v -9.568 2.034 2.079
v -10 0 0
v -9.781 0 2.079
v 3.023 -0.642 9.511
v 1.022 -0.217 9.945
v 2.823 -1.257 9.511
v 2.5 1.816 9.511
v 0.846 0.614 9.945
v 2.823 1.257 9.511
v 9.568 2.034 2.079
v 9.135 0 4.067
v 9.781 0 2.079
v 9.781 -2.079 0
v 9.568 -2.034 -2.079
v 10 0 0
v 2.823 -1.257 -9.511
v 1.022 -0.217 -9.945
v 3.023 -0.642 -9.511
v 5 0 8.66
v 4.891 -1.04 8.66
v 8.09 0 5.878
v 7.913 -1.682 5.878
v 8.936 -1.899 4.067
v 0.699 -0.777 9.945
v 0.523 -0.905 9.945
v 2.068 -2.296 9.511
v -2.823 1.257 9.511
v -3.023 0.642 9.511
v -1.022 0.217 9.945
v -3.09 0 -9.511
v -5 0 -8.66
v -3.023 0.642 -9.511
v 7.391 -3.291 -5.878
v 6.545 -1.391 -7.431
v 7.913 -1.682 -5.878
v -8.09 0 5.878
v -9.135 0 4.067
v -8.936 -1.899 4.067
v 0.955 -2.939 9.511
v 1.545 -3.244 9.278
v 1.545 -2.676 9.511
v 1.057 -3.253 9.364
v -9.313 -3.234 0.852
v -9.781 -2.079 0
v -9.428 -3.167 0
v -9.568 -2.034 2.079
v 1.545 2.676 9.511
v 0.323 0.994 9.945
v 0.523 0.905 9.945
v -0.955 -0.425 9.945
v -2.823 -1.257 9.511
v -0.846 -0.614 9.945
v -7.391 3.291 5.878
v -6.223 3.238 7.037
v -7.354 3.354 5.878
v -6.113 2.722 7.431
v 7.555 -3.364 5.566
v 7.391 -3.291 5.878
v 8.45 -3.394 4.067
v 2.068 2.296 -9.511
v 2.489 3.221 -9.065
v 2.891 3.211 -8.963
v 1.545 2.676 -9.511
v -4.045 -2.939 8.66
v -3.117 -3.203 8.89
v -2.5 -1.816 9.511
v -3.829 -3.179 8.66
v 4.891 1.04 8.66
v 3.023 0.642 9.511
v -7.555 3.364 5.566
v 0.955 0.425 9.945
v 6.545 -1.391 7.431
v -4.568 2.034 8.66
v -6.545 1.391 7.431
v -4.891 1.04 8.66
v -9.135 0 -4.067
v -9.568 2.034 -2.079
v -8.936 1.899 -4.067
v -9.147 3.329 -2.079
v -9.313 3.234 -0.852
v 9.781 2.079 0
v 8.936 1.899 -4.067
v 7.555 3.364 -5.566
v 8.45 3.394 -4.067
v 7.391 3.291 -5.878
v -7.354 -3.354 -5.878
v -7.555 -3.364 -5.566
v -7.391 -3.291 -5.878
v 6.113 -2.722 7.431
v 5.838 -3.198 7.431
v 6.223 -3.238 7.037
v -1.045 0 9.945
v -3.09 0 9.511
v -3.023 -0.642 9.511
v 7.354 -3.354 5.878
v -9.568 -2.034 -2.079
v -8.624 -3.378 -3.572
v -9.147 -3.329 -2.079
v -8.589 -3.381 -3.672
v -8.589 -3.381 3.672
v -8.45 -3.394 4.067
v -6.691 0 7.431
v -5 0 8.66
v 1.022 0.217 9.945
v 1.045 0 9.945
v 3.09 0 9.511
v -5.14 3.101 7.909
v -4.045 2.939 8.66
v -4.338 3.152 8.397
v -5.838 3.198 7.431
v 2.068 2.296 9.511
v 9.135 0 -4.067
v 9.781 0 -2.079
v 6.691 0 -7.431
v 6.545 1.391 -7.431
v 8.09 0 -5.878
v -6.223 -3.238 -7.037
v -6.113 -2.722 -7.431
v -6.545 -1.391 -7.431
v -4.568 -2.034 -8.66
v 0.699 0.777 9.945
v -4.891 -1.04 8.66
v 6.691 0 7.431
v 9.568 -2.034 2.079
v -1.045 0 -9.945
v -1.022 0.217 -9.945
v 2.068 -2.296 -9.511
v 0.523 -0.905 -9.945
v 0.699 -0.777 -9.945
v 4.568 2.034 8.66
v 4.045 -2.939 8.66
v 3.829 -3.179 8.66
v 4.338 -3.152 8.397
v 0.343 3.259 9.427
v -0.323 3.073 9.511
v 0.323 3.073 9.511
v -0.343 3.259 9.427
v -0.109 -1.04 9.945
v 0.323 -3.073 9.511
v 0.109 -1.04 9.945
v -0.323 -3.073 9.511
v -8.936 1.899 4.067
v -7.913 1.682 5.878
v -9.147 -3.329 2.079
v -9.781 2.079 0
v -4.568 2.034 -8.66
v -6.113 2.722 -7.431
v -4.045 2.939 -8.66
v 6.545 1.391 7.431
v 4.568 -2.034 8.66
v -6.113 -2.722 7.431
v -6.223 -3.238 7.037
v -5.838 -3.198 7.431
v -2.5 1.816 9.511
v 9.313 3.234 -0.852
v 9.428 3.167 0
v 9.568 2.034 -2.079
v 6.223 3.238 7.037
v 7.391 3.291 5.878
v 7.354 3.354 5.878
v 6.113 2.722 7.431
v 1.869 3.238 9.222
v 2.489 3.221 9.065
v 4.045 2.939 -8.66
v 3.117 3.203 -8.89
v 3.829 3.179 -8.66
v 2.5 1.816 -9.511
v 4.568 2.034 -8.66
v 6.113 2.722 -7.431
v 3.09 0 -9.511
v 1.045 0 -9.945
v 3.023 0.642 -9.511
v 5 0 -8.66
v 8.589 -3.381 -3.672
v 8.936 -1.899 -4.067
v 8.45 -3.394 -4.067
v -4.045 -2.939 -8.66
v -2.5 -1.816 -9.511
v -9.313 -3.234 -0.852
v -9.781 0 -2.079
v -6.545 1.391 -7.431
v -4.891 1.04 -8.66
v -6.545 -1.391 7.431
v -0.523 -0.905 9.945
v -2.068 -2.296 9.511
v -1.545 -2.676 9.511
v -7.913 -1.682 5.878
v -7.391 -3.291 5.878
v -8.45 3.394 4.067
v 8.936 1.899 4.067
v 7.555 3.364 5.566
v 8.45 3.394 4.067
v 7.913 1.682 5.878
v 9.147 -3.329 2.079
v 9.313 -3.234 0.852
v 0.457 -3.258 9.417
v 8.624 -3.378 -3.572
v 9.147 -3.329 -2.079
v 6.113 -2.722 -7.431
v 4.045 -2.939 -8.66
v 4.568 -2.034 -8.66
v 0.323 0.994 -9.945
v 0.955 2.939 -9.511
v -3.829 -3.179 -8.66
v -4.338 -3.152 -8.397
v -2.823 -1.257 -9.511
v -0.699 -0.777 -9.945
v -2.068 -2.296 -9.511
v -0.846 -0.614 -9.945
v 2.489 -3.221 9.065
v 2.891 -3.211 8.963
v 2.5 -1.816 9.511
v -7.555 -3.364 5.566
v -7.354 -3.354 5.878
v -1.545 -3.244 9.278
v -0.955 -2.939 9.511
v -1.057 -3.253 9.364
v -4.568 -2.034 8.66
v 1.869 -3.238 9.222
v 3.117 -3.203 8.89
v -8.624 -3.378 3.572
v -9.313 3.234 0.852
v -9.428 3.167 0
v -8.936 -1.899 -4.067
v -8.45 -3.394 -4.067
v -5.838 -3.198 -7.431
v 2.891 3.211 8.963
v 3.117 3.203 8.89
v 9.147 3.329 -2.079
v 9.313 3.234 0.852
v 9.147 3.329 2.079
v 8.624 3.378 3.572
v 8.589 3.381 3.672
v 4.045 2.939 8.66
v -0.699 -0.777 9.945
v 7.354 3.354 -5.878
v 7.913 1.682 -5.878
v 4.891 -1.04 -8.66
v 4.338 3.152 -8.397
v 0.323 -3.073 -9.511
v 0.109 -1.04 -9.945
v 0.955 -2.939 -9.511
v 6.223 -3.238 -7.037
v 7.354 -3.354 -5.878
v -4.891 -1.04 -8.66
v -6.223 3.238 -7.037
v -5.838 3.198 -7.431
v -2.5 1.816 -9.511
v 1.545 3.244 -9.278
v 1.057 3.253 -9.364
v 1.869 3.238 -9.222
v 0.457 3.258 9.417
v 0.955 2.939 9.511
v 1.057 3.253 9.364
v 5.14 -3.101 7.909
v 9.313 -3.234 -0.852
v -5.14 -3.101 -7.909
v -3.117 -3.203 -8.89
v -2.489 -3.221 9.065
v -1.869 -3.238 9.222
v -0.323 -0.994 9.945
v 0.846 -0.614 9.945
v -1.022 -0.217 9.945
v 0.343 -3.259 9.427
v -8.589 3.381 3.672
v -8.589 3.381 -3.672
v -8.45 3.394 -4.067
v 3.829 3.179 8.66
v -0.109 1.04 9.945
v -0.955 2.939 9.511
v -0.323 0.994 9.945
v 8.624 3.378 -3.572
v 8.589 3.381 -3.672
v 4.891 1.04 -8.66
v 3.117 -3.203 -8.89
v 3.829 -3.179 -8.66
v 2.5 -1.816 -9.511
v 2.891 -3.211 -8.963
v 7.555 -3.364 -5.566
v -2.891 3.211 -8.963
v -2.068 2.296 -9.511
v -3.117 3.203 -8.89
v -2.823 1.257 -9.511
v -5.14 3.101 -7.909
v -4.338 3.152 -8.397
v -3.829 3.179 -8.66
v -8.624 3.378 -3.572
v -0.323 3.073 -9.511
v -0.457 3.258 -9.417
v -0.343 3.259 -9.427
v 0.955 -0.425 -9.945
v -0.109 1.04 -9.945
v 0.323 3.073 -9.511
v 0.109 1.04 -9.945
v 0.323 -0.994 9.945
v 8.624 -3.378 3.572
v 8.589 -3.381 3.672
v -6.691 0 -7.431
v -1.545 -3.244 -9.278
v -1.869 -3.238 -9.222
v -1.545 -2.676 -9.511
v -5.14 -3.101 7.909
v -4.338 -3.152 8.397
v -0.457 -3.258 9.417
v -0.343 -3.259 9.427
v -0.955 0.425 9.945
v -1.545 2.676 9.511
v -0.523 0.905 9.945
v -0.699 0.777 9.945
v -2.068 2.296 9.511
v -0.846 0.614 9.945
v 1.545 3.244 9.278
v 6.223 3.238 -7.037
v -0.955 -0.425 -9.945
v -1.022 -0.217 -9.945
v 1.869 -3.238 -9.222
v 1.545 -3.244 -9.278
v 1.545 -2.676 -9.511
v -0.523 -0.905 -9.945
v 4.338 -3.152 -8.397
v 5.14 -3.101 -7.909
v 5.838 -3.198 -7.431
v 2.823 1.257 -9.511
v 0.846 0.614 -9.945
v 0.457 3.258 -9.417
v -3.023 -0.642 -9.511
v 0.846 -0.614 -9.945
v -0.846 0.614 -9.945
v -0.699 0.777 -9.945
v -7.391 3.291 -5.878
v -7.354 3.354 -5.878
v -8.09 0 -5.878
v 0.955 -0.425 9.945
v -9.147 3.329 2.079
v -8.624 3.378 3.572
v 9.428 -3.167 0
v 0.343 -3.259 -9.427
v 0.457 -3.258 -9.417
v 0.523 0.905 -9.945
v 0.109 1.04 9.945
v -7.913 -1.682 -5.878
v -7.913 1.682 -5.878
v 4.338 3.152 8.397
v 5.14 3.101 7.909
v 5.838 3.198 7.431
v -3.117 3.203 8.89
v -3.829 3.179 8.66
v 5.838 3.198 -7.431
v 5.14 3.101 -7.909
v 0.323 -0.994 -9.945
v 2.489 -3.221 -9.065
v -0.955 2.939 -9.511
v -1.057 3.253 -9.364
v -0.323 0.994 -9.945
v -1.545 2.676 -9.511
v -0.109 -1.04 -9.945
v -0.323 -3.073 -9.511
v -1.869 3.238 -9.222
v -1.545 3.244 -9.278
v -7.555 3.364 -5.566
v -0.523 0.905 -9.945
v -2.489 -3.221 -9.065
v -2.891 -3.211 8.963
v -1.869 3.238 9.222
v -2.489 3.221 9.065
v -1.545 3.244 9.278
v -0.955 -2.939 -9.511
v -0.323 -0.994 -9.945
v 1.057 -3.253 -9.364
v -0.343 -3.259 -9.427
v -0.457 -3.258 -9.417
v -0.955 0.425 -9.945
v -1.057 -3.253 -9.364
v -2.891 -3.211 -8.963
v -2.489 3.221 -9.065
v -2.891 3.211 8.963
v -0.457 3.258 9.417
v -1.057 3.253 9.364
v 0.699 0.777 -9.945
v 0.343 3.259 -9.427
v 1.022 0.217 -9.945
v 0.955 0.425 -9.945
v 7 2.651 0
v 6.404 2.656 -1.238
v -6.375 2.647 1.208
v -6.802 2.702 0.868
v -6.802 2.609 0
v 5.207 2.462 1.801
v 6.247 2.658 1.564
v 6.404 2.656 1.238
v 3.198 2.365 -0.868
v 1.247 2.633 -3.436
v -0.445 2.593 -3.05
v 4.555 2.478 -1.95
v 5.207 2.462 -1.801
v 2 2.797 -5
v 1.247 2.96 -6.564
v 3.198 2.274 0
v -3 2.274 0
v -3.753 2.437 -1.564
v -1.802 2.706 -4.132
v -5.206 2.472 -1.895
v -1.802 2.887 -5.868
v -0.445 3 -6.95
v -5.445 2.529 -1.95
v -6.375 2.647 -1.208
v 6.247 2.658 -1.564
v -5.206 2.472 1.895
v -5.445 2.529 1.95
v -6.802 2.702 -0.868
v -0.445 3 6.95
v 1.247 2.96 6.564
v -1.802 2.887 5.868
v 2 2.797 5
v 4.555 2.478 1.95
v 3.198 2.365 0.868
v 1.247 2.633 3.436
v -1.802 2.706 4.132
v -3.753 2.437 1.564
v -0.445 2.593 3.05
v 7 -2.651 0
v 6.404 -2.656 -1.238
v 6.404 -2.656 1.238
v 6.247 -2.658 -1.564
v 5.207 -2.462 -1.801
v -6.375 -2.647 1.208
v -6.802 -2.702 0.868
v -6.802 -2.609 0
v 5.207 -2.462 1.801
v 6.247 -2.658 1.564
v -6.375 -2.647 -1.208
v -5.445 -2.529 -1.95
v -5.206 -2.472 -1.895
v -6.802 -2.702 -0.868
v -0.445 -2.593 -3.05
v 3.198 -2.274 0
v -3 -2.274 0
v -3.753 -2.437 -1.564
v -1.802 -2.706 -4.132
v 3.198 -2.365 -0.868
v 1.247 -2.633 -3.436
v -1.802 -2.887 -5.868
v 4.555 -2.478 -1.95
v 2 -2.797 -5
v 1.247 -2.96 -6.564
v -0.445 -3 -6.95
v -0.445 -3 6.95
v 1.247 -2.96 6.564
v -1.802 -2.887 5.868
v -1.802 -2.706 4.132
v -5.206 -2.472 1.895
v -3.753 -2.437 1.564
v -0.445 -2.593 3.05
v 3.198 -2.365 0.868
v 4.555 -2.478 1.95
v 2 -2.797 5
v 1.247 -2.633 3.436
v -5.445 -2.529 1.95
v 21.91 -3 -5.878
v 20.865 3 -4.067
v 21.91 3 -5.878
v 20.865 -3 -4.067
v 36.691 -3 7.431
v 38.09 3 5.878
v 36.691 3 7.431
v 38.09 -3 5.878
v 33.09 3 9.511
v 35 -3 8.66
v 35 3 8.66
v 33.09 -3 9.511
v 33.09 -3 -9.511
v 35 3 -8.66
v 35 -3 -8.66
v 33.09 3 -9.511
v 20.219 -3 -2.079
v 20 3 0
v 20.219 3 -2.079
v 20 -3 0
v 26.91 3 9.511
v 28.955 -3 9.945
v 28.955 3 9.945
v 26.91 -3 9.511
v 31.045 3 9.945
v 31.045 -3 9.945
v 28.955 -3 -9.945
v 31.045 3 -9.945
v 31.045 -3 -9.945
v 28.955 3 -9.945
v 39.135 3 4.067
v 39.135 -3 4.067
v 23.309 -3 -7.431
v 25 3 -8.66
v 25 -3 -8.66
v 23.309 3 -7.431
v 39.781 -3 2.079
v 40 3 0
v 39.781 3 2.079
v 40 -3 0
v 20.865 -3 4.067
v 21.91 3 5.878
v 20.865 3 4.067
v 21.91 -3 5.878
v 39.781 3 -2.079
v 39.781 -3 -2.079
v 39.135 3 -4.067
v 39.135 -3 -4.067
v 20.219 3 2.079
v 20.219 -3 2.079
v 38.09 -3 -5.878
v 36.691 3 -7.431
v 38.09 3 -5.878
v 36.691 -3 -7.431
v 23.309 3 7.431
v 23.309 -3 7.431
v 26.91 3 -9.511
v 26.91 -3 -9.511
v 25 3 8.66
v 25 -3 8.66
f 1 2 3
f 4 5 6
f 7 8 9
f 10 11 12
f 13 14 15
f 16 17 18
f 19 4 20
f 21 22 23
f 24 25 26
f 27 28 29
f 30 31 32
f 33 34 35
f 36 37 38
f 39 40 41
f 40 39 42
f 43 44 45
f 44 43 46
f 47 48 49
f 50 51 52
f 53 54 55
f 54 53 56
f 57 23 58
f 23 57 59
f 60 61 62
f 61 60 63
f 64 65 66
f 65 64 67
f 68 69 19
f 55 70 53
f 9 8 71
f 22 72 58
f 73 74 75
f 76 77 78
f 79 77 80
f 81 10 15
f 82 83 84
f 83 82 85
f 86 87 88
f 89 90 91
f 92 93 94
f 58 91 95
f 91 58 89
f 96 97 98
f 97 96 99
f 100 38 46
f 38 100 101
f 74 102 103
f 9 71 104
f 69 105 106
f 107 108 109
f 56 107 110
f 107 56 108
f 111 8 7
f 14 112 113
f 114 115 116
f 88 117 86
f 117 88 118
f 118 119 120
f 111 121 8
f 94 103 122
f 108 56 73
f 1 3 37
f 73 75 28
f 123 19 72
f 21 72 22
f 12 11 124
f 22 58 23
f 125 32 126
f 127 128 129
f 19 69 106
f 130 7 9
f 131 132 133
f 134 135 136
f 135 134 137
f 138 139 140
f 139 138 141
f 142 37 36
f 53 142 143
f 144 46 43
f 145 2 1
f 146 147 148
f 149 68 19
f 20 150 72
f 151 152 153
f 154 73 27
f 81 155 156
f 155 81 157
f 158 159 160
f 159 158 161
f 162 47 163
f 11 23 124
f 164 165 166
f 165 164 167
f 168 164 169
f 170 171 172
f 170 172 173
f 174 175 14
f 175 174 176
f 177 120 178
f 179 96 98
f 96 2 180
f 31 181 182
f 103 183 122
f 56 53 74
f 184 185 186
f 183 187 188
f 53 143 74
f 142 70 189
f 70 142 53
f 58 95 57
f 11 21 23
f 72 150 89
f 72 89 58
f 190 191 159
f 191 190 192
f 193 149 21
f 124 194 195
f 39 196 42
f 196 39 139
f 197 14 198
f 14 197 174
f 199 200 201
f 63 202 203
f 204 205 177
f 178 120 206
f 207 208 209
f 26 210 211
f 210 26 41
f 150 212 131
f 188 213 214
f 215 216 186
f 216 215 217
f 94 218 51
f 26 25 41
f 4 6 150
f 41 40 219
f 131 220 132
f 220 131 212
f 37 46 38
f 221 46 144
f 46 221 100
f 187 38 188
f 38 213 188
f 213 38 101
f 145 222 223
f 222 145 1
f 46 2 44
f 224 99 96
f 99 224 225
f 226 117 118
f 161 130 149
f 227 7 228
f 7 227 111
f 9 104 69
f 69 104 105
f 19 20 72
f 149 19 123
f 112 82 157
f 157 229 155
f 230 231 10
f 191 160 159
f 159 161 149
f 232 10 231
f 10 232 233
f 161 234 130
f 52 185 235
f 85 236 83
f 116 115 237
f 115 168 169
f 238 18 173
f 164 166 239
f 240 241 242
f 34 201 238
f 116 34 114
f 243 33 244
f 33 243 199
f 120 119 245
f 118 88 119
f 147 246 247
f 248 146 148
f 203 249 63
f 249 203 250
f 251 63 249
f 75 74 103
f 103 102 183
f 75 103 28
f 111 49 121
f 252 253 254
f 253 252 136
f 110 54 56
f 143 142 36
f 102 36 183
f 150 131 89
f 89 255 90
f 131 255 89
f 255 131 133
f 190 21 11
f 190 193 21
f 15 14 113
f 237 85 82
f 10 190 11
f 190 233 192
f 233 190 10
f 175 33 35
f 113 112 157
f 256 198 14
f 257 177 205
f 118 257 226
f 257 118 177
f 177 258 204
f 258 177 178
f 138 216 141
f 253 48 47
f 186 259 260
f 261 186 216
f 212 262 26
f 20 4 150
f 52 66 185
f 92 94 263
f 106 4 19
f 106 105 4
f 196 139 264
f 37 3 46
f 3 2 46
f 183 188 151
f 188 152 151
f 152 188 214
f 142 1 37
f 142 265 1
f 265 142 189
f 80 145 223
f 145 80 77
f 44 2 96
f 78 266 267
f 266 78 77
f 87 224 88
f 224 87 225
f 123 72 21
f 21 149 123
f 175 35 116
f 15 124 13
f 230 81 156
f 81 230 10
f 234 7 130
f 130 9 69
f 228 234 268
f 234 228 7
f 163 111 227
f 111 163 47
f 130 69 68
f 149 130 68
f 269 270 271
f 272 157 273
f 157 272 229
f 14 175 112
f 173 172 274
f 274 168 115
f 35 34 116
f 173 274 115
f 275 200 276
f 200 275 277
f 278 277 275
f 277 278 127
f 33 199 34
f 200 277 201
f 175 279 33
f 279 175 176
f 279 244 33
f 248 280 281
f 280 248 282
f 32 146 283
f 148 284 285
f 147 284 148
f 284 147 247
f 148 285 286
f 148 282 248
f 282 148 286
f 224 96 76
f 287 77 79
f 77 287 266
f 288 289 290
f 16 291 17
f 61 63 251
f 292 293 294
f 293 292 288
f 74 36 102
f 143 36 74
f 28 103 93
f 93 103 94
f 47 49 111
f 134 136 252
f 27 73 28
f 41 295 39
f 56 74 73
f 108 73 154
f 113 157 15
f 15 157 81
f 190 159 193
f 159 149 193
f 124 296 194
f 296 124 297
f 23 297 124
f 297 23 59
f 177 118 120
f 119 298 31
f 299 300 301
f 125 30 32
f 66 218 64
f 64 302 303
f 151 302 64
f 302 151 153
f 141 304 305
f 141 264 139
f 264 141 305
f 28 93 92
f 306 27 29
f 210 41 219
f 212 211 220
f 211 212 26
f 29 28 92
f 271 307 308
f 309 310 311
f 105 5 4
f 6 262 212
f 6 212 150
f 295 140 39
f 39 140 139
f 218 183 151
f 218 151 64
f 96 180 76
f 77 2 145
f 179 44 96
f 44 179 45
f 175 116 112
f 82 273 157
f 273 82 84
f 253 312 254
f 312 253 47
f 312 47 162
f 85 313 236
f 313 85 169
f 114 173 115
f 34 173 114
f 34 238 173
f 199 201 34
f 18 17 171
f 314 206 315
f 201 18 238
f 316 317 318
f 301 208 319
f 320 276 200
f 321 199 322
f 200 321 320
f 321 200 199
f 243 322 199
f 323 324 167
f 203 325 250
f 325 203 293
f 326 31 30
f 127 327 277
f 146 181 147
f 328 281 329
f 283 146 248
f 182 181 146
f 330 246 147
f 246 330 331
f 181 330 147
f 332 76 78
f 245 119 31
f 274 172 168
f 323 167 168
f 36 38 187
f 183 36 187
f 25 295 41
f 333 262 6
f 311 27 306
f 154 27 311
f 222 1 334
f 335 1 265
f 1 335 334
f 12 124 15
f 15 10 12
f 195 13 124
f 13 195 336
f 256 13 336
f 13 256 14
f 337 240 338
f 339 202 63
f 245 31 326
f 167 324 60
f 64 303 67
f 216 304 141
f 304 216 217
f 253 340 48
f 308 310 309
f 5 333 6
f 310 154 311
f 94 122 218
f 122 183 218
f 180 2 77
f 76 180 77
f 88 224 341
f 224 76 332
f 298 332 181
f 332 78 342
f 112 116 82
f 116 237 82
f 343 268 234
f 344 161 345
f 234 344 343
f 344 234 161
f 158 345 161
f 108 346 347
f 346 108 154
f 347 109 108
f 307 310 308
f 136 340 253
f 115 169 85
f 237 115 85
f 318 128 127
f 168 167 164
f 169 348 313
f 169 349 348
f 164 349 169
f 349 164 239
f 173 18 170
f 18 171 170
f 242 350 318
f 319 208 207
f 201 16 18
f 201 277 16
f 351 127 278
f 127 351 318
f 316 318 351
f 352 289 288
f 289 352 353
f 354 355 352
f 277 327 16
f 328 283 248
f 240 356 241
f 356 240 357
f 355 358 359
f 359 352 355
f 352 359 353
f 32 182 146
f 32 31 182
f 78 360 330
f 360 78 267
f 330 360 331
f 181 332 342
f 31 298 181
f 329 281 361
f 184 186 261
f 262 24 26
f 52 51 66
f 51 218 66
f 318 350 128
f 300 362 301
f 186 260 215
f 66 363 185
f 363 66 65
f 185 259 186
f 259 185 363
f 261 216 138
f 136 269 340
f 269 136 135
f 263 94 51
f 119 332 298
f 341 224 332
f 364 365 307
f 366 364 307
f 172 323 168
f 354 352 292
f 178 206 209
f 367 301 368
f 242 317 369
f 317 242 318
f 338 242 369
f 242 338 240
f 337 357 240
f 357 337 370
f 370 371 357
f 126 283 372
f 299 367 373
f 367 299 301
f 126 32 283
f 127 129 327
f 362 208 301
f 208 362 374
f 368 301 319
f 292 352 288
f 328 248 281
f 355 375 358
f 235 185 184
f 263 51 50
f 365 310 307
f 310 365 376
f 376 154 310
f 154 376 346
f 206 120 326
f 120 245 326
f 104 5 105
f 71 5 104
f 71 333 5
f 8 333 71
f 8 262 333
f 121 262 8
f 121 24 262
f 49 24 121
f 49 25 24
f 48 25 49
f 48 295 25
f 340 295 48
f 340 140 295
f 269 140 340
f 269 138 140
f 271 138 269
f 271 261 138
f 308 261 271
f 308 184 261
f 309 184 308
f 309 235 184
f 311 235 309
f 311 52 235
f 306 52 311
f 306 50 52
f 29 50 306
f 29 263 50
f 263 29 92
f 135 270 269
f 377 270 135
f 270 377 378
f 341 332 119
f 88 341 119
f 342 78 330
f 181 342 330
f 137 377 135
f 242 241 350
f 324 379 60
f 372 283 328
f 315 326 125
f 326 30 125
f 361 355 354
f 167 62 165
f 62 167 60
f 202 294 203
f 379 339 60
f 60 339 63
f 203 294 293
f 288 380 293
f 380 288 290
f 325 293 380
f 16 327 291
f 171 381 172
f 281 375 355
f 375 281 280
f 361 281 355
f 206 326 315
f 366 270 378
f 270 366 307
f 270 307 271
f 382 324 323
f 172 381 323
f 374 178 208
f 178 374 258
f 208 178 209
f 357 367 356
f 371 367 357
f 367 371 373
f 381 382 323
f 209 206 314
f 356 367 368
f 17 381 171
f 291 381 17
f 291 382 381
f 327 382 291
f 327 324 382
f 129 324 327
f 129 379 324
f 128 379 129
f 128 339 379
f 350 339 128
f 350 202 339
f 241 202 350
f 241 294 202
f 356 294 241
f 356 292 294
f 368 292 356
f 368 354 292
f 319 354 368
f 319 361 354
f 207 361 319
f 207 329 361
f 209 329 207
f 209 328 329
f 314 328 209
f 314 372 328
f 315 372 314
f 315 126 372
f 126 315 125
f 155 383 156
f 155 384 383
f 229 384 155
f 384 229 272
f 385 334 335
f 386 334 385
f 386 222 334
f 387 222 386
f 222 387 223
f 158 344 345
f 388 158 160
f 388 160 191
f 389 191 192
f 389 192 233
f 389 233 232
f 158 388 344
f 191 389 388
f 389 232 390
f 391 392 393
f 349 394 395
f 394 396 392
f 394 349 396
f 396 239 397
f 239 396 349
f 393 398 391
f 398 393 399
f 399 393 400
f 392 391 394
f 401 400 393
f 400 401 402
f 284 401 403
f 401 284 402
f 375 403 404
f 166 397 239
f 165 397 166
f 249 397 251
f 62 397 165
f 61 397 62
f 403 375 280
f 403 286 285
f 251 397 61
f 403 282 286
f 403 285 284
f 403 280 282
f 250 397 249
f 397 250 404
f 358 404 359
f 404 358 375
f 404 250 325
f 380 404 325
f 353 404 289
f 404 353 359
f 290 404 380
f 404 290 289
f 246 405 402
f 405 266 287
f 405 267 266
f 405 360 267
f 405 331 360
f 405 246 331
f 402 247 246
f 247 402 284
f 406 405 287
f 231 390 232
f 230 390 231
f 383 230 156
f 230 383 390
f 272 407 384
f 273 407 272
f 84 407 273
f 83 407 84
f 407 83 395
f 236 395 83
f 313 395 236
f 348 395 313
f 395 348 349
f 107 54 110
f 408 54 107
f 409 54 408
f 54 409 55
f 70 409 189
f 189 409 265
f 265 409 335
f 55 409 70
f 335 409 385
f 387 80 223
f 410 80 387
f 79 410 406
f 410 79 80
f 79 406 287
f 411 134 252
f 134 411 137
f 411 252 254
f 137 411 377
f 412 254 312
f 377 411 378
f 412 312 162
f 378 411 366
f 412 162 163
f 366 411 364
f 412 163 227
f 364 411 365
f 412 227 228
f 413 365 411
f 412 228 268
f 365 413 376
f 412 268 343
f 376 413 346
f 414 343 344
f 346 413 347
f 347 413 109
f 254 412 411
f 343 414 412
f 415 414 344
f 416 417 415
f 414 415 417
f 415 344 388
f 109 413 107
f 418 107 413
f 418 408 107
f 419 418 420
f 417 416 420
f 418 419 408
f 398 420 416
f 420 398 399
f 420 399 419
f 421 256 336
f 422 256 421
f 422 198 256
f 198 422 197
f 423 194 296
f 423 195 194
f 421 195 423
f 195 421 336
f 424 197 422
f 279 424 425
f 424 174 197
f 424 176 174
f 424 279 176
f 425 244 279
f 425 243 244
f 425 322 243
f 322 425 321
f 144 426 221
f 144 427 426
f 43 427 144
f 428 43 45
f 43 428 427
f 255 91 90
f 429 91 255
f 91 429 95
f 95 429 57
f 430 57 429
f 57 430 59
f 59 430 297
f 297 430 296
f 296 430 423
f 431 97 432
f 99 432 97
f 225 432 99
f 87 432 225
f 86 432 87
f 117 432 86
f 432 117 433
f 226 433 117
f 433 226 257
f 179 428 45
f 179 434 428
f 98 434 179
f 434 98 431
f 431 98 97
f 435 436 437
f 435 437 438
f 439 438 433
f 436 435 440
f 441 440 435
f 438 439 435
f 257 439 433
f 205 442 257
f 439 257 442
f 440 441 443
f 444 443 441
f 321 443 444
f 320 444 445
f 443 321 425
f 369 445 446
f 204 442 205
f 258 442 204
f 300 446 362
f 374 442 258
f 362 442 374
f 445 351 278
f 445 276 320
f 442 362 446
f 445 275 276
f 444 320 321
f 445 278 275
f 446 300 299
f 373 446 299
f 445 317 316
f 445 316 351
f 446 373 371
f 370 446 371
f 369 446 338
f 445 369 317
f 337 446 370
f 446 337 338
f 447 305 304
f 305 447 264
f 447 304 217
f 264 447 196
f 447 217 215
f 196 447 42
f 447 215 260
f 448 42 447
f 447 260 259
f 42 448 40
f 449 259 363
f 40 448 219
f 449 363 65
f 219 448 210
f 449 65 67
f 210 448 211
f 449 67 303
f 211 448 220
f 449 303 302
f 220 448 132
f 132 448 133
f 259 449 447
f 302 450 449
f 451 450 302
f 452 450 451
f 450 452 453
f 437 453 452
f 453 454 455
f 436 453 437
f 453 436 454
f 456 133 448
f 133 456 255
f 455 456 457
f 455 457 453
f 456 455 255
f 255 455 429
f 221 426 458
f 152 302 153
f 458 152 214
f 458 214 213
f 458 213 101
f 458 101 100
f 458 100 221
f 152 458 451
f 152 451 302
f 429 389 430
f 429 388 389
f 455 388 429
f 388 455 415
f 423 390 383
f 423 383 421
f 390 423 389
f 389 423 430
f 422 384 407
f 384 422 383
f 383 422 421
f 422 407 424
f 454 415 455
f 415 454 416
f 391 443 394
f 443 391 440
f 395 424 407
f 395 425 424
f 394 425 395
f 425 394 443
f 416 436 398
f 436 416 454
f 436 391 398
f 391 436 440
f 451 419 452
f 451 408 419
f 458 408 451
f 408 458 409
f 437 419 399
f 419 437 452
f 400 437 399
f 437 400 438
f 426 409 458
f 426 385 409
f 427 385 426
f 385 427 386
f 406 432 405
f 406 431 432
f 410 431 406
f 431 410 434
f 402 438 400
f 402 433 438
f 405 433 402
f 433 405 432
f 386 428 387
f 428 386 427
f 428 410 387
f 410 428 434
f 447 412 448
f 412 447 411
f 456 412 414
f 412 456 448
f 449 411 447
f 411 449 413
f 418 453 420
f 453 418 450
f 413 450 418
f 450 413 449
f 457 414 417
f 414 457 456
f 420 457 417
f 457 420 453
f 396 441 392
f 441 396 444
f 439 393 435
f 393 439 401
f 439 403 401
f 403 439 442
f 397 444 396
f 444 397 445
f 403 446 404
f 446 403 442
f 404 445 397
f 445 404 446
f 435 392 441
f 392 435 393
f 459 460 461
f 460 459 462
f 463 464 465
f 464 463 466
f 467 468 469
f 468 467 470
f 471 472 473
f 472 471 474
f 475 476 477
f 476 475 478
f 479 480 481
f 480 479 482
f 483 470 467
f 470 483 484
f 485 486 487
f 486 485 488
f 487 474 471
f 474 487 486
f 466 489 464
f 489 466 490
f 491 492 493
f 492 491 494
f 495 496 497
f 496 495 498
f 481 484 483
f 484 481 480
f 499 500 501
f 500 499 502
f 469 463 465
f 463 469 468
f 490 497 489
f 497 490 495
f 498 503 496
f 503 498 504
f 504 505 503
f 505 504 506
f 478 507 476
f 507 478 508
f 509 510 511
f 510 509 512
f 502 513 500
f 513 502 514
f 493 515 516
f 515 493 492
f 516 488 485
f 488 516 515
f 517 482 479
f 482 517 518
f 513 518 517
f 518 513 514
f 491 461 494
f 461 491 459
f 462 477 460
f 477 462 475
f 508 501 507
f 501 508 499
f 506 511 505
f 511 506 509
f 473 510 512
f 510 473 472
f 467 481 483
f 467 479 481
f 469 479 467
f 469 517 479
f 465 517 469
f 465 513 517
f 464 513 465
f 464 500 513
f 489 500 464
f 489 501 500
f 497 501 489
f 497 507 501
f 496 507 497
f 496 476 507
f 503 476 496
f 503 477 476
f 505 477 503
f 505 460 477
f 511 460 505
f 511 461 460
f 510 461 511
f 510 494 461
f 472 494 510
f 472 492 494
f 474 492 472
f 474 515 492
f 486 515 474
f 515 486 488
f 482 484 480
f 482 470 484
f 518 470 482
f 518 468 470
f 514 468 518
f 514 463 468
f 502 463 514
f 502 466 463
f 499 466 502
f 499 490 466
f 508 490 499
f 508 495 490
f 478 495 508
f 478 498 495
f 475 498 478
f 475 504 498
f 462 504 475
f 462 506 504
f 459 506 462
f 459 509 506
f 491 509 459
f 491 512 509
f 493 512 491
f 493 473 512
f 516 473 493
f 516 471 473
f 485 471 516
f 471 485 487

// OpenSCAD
//$fa=1;
//$fs=0.4;

module simple_wheel(wheel_radius=10, wheel_width=6) {
    rotate([90,0,0])
        cylinder(h=wheel_width,r=wheel_radius,center=true);
    }
translate([30,0,0])
    simple_wheel();

module complex_wheel(wheel_radius=10, side_spheres_radius=50, hub_thickness=4, cylinder_radius=2) {
    cylinder_height=2 * wheel_radius;
    difference() {
        // Wheel sphere
       sphere(r=wheel_radius);
        // Side wheel 1
        translate([0,side_spheres_radius + hub_thickness/2, 0])
            sphere(r=side_spheres_radius);
        // Side wheel 2
        translate([0,-(side_spheres_radius + hub_thickness/2), 0])
            sphere(r=side_spheres_radius);
        //Cylinder 1
        translate([wheel_radius/2, 0, 0])
            rotate([90,0,0])
                cylinder(h=cylinder_height, r=cylinder_radius, center=true);
        //Cylinder 2
        translate([-wheel_radius/2, 0, 0])
            rotate([90,0,0])
                cylinder(h=cylinder_height, r=cylinder_radius, center=true);
        //Cylinder 1
        translate([0,0,wheel_radius/2])
            rotate([90,0,0])
                cylinder(h=cylinder_height, r=cylinder_radius, center=true);
        //Cylinder 1
        translate([0,0,-wheel_radius/2])
            rotate([90,0,0])
                cylinder(h=cylinder_height, r=cylinder_radius, center=true);
    }
}
complex_wheel();
